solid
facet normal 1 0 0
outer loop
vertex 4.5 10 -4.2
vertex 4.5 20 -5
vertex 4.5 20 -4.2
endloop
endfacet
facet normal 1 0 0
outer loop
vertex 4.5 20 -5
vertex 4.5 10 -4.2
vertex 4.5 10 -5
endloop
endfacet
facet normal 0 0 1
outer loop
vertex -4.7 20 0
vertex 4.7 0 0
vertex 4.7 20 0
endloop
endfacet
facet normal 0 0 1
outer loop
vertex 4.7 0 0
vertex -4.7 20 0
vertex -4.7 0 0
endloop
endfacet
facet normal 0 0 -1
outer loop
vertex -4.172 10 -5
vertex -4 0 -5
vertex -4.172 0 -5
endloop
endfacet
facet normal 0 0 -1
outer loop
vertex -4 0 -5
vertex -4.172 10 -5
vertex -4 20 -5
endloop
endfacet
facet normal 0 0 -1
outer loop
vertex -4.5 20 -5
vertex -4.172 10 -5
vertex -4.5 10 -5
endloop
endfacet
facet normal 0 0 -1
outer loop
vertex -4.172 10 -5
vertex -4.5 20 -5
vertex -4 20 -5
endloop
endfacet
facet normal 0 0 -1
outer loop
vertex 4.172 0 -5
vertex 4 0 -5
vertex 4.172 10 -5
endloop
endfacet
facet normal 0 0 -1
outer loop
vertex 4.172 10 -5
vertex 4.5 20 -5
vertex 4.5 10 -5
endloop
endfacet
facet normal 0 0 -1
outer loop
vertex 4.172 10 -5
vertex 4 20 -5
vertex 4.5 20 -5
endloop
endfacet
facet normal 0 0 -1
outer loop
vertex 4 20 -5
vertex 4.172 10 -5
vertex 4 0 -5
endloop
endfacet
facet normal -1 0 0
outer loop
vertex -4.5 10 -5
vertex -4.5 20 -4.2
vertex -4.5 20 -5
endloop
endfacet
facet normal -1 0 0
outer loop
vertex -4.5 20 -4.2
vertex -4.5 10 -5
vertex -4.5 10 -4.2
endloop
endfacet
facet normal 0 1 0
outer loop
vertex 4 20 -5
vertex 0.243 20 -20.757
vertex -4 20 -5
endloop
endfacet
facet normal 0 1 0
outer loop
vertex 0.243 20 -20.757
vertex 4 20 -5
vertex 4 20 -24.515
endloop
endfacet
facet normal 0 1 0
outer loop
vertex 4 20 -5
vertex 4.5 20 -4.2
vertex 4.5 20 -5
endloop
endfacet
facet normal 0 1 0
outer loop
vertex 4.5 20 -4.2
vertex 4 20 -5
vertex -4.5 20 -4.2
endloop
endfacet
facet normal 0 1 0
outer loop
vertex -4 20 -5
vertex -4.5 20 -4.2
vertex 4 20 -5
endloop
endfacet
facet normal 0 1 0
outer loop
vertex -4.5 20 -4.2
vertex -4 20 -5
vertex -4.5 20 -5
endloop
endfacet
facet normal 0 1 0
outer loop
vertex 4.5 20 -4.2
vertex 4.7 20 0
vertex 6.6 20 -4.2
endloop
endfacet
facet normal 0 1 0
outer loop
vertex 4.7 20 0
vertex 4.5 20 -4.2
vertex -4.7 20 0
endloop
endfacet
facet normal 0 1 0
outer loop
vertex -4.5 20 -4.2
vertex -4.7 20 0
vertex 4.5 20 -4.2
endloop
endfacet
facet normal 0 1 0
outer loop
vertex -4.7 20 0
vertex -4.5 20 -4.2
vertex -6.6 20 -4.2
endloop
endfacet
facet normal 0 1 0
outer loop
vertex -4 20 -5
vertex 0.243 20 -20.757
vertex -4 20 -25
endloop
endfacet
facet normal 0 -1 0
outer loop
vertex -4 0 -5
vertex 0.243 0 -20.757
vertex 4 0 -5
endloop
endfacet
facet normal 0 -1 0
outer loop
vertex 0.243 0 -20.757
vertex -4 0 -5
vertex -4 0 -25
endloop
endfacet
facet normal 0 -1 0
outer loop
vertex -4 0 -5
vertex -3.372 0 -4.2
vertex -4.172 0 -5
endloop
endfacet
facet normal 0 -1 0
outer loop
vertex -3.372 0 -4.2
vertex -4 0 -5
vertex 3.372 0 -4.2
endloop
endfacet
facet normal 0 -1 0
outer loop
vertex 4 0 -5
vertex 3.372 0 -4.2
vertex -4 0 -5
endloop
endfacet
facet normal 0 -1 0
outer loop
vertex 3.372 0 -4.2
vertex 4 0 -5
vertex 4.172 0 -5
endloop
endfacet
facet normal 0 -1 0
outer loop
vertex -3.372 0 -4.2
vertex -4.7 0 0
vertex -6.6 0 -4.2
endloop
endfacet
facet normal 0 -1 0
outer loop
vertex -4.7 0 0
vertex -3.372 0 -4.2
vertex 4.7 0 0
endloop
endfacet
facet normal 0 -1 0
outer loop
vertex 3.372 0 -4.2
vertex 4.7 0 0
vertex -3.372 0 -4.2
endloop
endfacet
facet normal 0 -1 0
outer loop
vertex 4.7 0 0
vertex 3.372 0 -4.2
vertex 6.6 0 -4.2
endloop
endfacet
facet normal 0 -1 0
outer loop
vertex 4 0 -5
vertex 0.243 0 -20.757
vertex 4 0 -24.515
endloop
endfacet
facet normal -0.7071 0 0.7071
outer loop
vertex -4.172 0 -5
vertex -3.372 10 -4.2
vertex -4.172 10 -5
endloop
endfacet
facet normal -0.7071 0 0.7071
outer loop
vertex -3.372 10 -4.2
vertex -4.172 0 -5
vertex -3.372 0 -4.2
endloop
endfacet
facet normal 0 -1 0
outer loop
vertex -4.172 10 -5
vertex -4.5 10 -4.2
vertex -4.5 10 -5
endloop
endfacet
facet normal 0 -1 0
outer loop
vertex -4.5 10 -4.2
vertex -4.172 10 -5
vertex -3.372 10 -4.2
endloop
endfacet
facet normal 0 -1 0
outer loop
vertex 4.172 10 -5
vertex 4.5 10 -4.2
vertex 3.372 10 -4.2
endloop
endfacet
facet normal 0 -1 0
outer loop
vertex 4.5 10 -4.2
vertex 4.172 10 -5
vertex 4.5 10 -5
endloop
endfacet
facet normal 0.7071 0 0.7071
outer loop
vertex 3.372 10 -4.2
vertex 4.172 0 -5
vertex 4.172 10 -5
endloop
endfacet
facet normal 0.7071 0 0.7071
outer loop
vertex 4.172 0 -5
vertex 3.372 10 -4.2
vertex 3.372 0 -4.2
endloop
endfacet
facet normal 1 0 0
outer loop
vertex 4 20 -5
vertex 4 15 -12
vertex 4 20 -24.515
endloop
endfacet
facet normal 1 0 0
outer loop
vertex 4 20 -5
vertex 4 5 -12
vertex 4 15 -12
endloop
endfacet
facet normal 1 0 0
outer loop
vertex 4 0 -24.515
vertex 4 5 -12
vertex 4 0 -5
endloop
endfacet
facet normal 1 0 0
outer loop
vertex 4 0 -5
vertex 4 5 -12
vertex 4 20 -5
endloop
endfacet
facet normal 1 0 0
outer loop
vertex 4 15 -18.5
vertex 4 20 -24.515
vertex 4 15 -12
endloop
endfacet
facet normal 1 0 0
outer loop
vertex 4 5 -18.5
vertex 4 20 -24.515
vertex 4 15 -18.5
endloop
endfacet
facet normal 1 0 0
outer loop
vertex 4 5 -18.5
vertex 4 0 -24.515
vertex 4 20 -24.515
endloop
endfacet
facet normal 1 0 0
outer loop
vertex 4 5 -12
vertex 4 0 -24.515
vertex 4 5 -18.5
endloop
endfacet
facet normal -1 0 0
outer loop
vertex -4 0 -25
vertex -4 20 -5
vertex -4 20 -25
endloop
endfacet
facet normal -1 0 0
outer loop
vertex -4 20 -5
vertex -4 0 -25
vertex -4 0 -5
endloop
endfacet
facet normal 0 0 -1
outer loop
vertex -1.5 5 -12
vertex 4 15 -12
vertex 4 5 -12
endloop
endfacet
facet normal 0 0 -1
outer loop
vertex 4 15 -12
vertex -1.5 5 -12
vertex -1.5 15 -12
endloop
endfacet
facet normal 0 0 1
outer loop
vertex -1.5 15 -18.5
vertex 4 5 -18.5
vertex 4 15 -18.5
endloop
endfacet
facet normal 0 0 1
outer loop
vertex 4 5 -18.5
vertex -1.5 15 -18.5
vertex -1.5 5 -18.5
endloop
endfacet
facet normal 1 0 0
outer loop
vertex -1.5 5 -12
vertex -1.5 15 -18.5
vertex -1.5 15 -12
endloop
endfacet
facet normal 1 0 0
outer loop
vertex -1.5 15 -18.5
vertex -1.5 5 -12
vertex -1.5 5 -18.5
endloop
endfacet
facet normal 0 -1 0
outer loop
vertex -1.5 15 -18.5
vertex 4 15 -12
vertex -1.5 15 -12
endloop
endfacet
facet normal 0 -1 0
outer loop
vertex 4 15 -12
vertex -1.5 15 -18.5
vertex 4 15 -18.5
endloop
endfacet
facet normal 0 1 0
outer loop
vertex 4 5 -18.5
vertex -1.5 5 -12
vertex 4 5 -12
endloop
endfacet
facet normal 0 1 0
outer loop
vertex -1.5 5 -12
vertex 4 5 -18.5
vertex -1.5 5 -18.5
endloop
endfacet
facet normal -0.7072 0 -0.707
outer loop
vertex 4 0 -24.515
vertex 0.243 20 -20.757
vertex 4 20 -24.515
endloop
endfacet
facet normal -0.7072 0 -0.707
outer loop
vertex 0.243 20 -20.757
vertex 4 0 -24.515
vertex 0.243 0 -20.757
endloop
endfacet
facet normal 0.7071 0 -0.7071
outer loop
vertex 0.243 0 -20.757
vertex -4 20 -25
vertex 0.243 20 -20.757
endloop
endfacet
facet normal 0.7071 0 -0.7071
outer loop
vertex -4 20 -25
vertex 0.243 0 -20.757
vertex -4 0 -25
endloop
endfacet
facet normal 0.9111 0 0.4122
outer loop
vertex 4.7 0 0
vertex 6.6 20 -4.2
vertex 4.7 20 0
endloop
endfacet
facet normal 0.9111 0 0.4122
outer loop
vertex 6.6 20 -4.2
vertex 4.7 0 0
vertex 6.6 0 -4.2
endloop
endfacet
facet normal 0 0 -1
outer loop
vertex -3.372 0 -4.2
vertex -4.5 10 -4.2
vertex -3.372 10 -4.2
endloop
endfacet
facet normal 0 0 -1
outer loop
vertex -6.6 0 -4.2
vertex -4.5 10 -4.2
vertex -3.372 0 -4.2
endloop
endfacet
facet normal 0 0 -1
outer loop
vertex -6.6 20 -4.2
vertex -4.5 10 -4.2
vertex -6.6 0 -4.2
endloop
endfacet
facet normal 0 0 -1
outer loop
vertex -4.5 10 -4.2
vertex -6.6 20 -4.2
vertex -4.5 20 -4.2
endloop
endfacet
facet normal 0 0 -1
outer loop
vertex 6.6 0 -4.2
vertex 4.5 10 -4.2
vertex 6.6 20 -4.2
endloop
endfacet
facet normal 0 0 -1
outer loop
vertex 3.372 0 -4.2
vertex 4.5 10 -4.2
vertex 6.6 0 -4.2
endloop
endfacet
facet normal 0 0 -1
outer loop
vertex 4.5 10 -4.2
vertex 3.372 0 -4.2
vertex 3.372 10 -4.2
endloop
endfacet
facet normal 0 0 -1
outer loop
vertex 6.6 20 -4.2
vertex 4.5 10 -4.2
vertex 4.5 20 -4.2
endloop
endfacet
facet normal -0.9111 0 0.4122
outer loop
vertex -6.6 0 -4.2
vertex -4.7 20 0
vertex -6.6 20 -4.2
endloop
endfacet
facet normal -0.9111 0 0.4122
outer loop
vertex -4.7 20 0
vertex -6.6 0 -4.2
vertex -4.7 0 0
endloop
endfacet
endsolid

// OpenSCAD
// ===================================================================
// 智能玩具电子锁盒 - 零部件 3: 易损断裂卡扣 (Breakaway Latch)
// CAD 级高精度生产模型 (建议使用普通 PLA 打印以保证脆断性)
// ===================================================================

$fn = 40;

slider_len   = 20.0;
slider_w     = 10.0;
slider_h     = 4.2;
neck_thick   = 1.2;  // V型切槽处仅保留 1.2mm 厚度
hook_len     = 20.0; // 下垂锁钩长度

module breakaway_latch() {
    union() {
        // 1. 燕尾滑块 (Male Dovetail Slider)
        // 配合顶盖内侧母槽 (单边留 0.2mm 打印滑动公差)
        translate([0, 0, 0])
            rotate([-90, 0, 0])
            linear_extrude(height=slider_len)
            polygon(points=[[-4.7, 0], [4.7, 0], [6.6, slider_h], [-6.6, slider_h]]);

        // 2. V 型断裂颈部 (Breakaway Neck with V-grooves)
        translate([-4.5, 0, -5]) {
            difference() {
                cube([9, slider_len, 5]);
                // 两侧 45° V 型切削槽
                translate([0, -1, 2.5])
                    rotate([0, 45, 0])
                    cube([4, slider_len + 2, 4], center=true);
                translate([9, -1, 2.5])
                    rotate([0, 45, 0])
                    cube([4, slider_len + 2, 4], center=true);
            }
        }

        // 3. 垂直下垂锁钩主体 (Locking Hook Body)
        translate([-4.0, 0, -5 - hook_len]) {
            difference() {
                // 实体方柱
                cube([8.0, slider_len, hook_len]);

                // 侧面供舵机锁舌插入的方槽 (Locking Cavity facing +X)
                // 精准对齐舵机摆臂标高 Z=32.9~35.9mm (留上下各 1.0mm 动态咬合裕量)
                translate([2.5, (slider_len - 10)/2, 6.5])
                    cube([6.0, 10.0, 6.5]);

                // 底部 45° 导向顺滑倒角 (Lead-in Chamfer)
                translate([0, -1, 0])
                    rotate([0, 45, 0])
                    cube([6.0, slider_len + 2, 6.0]);
            }
        }
    }
}

breakaway_latch();
